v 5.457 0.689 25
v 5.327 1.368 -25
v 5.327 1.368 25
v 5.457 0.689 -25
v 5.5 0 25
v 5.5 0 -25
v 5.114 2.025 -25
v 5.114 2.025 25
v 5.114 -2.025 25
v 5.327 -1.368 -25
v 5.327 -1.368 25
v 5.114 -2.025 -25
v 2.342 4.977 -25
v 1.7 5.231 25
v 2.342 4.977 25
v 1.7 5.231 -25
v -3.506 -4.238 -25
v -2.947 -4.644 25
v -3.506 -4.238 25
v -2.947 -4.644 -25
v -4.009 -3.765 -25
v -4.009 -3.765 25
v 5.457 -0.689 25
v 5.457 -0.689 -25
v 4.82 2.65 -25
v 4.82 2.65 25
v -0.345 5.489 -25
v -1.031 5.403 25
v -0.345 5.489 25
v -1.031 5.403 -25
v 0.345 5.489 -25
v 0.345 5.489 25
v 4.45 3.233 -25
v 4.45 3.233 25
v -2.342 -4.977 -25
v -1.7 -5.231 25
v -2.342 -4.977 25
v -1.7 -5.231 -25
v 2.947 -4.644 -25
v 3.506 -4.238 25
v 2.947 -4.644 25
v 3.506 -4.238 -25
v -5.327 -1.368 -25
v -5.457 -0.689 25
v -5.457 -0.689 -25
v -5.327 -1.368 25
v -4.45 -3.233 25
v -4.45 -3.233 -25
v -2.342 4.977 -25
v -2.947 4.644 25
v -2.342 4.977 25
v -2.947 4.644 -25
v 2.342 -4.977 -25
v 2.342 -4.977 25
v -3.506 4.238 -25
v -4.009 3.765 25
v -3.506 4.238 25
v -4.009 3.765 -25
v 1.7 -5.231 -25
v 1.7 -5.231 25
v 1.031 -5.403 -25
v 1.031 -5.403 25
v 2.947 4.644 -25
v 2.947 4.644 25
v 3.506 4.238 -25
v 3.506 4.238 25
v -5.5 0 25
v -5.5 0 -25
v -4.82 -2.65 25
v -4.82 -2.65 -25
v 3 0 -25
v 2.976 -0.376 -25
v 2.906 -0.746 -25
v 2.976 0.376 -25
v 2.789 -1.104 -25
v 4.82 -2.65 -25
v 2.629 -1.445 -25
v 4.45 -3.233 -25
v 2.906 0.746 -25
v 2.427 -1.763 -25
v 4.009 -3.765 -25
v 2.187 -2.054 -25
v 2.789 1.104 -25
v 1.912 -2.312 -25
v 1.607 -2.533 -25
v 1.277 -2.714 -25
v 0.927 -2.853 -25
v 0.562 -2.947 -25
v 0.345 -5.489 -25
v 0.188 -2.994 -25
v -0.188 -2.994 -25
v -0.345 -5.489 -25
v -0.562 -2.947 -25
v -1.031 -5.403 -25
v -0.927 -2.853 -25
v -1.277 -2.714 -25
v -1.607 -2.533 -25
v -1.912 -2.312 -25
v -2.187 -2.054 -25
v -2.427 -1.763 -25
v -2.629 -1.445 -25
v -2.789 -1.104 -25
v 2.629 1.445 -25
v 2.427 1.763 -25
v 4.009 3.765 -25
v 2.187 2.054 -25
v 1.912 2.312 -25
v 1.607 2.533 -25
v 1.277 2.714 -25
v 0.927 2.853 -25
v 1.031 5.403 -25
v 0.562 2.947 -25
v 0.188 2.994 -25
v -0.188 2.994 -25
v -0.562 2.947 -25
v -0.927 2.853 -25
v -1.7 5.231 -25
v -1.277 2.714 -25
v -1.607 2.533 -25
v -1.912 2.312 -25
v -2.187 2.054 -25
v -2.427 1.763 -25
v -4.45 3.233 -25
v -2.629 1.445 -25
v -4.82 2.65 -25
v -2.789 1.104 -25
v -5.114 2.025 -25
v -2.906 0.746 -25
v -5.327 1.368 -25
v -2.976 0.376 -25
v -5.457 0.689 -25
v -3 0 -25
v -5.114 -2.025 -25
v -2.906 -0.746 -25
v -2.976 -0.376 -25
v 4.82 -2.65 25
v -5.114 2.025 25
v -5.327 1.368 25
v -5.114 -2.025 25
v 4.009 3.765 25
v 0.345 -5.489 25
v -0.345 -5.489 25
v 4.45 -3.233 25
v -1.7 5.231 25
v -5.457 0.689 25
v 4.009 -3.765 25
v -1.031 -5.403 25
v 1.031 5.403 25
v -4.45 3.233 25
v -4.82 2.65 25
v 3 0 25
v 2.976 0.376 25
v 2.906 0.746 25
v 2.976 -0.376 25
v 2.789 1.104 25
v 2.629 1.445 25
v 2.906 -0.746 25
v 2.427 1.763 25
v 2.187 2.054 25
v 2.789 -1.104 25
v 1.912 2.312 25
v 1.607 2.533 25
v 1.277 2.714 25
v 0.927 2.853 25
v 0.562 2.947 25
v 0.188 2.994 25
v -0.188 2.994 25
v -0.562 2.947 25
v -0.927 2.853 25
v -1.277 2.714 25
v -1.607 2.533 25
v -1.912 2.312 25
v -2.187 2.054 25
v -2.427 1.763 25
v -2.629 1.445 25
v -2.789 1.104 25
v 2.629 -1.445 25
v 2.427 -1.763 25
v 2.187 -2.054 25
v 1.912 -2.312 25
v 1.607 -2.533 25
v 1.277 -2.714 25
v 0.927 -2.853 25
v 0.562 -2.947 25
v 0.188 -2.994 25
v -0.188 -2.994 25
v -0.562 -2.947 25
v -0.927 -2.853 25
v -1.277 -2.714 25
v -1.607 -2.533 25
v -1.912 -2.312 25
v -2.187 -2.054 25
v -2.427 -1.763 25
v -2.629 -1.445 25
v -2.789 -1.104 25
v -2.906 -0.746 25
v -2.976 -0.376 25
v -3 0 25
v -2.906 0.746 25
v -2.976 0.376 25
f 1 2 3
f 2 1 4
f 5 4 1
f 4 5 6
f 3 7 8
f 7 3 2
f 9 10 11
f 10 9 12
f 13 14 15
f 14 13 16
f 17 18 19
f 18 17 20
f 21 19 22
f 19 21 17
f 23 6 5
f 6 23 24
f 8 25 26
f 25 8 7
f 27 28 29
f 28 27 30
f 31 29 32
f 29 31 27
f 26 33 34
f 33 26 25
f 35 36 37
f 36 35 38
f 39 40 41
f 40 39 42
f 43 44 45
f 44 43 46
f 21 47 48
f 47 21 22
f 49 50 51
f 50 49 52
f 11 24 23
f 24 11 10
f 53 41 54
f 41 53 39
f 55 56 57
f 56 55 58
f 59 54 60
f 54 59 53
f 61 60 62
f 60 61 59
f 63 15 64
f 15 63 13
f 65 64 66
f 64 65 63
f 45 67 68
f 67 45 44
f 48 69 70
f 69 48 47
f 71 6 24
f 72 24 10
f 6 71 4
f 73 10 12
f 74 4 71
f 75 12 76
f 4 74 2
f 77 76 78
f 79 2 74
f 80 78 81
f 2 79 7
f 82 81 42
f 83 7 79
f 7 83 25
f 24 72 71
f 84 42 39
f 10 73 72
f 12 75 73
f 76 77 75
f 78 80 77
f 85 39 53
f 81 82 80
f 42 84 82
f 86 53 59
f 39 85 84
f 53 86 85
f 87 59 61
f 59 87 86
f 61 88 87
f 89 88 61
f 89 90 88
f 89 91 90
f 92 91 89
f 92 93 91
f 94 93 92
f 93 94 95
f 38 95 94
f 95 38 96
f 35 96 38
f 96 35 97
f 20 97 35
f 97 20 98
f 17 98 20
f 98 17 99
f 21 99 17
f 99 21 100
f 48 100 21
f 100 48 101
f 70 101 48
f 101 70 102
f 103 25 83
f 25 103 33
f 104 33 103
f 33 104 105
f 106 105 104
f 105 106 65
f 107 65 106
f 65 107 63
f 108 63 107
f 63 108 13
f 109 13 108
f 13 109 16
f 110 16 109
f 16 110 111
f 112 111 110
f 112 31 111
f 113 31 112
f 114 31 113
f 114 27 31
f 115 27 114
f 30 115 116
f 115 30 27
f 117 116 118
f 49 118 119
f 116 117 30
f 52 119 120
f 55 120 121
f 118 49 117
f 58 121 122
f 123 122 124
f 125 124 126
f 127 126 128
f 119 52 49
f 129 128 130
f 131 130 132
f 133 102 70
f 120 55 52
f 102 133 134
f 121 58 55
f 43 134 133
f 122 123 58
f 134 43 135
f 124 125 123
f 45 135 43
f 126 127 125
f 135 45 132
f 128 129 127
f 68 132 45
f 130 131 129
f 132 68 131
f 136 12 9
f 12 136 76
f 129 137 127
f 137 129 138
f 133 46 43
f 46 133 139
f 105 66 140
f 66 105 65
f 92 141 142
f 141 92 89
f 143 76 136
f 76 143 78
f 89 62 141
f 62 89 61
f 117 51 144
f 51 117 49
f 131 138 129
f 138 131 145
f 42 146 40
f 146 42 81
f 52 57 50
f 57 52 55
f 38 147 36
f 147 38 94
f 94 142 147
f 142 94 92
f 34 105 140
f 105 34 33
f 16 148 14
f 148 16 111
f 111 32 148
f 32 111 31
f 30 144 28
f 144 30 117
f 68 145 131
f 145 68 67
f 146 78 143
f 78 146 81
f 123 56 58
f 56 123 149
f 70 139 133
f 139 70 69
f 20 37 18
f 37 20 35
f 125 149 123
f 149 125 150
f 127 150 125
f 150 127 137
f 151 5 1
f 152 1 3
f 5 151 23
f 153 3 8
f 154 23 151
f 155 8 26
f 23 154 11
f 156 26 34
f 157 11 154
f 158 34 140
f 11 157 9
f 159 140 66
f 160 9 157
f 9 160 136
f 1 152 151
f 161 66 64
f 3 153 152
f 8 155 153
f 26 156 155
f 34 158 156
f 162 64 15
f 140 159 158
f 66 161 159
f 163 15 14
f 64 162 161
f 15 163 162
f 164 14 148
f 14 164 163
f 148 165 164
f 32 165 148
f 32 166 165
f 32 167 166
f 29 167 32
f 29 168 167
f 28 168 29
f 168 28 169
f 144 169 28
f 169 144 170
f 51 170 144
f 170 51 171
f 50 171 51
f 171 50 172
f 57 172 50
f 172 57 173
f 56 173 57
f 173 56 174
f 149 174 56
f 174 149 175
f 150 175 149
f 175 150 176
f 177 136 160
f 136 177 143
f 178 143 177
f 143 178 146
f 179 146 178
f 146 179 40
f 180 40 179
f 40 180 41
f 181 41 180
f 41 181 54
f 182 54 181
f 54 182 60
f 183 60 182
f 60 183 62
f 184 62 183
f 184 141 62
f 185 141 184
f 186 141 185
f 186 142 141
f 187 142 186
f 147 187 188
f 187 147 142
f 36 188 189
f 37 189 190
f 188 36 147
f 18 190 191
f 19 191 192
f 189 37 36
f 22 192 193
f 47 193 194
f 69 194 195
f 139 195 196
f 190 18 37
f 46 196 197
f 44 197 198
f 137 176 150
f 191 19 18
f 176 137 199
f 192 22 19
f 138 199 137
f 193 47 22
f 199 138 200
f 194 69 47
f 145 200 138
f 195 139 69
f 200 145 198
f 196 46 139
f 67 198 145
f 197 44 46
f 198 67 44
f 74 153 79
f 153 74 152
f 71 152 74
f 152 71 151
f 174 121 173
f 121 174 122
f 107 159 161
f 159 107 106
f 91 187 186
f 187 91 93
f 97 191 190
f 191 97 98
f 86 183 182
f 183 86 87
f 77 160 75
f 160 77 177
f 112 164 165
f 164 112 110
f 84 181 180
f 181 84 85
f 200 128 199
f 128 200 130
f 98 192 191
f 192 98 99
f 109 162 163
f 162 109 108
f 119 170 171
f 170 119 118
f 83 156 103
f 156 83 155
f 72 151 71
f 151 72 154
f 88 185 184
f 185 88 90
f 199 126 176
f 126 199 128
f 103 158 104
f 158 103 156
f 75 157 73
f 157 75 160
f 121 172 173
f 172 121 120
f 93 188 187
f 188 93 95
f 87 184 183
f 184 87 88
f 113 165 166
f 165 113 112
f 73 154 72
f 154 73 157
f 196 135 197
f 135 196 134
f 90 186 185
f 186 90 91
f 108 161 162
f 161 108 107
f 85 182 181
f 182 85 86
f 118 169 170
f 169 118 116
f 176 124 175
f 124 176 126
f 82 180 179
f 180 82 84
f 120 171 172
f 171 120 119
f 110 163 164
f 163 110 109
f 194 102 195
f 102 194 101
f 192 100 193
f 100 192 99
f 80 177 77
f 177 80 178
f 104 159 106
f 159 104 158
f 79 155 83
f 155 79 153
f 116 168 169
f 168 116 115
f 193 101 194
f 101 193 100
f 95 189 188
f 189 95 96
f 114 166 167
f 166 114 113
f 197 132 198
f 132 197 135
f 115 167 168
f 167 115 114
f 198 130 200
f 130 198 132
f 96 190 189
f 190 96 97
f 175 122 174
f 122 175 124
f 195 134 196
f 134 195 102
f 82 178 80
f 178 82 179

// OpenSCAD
$fn = 50;


difference() {
	union() {
		translate(v = [0, 0, -25.0000000000]) {
			cylinder(h = 50, r = 5.5000000000);
		}
	}
	union() {
		translate(v = [0, 0, -100.0000000000]) {
			cylinder(h = 200, r = 3.0000000000);
		}
	}
}
